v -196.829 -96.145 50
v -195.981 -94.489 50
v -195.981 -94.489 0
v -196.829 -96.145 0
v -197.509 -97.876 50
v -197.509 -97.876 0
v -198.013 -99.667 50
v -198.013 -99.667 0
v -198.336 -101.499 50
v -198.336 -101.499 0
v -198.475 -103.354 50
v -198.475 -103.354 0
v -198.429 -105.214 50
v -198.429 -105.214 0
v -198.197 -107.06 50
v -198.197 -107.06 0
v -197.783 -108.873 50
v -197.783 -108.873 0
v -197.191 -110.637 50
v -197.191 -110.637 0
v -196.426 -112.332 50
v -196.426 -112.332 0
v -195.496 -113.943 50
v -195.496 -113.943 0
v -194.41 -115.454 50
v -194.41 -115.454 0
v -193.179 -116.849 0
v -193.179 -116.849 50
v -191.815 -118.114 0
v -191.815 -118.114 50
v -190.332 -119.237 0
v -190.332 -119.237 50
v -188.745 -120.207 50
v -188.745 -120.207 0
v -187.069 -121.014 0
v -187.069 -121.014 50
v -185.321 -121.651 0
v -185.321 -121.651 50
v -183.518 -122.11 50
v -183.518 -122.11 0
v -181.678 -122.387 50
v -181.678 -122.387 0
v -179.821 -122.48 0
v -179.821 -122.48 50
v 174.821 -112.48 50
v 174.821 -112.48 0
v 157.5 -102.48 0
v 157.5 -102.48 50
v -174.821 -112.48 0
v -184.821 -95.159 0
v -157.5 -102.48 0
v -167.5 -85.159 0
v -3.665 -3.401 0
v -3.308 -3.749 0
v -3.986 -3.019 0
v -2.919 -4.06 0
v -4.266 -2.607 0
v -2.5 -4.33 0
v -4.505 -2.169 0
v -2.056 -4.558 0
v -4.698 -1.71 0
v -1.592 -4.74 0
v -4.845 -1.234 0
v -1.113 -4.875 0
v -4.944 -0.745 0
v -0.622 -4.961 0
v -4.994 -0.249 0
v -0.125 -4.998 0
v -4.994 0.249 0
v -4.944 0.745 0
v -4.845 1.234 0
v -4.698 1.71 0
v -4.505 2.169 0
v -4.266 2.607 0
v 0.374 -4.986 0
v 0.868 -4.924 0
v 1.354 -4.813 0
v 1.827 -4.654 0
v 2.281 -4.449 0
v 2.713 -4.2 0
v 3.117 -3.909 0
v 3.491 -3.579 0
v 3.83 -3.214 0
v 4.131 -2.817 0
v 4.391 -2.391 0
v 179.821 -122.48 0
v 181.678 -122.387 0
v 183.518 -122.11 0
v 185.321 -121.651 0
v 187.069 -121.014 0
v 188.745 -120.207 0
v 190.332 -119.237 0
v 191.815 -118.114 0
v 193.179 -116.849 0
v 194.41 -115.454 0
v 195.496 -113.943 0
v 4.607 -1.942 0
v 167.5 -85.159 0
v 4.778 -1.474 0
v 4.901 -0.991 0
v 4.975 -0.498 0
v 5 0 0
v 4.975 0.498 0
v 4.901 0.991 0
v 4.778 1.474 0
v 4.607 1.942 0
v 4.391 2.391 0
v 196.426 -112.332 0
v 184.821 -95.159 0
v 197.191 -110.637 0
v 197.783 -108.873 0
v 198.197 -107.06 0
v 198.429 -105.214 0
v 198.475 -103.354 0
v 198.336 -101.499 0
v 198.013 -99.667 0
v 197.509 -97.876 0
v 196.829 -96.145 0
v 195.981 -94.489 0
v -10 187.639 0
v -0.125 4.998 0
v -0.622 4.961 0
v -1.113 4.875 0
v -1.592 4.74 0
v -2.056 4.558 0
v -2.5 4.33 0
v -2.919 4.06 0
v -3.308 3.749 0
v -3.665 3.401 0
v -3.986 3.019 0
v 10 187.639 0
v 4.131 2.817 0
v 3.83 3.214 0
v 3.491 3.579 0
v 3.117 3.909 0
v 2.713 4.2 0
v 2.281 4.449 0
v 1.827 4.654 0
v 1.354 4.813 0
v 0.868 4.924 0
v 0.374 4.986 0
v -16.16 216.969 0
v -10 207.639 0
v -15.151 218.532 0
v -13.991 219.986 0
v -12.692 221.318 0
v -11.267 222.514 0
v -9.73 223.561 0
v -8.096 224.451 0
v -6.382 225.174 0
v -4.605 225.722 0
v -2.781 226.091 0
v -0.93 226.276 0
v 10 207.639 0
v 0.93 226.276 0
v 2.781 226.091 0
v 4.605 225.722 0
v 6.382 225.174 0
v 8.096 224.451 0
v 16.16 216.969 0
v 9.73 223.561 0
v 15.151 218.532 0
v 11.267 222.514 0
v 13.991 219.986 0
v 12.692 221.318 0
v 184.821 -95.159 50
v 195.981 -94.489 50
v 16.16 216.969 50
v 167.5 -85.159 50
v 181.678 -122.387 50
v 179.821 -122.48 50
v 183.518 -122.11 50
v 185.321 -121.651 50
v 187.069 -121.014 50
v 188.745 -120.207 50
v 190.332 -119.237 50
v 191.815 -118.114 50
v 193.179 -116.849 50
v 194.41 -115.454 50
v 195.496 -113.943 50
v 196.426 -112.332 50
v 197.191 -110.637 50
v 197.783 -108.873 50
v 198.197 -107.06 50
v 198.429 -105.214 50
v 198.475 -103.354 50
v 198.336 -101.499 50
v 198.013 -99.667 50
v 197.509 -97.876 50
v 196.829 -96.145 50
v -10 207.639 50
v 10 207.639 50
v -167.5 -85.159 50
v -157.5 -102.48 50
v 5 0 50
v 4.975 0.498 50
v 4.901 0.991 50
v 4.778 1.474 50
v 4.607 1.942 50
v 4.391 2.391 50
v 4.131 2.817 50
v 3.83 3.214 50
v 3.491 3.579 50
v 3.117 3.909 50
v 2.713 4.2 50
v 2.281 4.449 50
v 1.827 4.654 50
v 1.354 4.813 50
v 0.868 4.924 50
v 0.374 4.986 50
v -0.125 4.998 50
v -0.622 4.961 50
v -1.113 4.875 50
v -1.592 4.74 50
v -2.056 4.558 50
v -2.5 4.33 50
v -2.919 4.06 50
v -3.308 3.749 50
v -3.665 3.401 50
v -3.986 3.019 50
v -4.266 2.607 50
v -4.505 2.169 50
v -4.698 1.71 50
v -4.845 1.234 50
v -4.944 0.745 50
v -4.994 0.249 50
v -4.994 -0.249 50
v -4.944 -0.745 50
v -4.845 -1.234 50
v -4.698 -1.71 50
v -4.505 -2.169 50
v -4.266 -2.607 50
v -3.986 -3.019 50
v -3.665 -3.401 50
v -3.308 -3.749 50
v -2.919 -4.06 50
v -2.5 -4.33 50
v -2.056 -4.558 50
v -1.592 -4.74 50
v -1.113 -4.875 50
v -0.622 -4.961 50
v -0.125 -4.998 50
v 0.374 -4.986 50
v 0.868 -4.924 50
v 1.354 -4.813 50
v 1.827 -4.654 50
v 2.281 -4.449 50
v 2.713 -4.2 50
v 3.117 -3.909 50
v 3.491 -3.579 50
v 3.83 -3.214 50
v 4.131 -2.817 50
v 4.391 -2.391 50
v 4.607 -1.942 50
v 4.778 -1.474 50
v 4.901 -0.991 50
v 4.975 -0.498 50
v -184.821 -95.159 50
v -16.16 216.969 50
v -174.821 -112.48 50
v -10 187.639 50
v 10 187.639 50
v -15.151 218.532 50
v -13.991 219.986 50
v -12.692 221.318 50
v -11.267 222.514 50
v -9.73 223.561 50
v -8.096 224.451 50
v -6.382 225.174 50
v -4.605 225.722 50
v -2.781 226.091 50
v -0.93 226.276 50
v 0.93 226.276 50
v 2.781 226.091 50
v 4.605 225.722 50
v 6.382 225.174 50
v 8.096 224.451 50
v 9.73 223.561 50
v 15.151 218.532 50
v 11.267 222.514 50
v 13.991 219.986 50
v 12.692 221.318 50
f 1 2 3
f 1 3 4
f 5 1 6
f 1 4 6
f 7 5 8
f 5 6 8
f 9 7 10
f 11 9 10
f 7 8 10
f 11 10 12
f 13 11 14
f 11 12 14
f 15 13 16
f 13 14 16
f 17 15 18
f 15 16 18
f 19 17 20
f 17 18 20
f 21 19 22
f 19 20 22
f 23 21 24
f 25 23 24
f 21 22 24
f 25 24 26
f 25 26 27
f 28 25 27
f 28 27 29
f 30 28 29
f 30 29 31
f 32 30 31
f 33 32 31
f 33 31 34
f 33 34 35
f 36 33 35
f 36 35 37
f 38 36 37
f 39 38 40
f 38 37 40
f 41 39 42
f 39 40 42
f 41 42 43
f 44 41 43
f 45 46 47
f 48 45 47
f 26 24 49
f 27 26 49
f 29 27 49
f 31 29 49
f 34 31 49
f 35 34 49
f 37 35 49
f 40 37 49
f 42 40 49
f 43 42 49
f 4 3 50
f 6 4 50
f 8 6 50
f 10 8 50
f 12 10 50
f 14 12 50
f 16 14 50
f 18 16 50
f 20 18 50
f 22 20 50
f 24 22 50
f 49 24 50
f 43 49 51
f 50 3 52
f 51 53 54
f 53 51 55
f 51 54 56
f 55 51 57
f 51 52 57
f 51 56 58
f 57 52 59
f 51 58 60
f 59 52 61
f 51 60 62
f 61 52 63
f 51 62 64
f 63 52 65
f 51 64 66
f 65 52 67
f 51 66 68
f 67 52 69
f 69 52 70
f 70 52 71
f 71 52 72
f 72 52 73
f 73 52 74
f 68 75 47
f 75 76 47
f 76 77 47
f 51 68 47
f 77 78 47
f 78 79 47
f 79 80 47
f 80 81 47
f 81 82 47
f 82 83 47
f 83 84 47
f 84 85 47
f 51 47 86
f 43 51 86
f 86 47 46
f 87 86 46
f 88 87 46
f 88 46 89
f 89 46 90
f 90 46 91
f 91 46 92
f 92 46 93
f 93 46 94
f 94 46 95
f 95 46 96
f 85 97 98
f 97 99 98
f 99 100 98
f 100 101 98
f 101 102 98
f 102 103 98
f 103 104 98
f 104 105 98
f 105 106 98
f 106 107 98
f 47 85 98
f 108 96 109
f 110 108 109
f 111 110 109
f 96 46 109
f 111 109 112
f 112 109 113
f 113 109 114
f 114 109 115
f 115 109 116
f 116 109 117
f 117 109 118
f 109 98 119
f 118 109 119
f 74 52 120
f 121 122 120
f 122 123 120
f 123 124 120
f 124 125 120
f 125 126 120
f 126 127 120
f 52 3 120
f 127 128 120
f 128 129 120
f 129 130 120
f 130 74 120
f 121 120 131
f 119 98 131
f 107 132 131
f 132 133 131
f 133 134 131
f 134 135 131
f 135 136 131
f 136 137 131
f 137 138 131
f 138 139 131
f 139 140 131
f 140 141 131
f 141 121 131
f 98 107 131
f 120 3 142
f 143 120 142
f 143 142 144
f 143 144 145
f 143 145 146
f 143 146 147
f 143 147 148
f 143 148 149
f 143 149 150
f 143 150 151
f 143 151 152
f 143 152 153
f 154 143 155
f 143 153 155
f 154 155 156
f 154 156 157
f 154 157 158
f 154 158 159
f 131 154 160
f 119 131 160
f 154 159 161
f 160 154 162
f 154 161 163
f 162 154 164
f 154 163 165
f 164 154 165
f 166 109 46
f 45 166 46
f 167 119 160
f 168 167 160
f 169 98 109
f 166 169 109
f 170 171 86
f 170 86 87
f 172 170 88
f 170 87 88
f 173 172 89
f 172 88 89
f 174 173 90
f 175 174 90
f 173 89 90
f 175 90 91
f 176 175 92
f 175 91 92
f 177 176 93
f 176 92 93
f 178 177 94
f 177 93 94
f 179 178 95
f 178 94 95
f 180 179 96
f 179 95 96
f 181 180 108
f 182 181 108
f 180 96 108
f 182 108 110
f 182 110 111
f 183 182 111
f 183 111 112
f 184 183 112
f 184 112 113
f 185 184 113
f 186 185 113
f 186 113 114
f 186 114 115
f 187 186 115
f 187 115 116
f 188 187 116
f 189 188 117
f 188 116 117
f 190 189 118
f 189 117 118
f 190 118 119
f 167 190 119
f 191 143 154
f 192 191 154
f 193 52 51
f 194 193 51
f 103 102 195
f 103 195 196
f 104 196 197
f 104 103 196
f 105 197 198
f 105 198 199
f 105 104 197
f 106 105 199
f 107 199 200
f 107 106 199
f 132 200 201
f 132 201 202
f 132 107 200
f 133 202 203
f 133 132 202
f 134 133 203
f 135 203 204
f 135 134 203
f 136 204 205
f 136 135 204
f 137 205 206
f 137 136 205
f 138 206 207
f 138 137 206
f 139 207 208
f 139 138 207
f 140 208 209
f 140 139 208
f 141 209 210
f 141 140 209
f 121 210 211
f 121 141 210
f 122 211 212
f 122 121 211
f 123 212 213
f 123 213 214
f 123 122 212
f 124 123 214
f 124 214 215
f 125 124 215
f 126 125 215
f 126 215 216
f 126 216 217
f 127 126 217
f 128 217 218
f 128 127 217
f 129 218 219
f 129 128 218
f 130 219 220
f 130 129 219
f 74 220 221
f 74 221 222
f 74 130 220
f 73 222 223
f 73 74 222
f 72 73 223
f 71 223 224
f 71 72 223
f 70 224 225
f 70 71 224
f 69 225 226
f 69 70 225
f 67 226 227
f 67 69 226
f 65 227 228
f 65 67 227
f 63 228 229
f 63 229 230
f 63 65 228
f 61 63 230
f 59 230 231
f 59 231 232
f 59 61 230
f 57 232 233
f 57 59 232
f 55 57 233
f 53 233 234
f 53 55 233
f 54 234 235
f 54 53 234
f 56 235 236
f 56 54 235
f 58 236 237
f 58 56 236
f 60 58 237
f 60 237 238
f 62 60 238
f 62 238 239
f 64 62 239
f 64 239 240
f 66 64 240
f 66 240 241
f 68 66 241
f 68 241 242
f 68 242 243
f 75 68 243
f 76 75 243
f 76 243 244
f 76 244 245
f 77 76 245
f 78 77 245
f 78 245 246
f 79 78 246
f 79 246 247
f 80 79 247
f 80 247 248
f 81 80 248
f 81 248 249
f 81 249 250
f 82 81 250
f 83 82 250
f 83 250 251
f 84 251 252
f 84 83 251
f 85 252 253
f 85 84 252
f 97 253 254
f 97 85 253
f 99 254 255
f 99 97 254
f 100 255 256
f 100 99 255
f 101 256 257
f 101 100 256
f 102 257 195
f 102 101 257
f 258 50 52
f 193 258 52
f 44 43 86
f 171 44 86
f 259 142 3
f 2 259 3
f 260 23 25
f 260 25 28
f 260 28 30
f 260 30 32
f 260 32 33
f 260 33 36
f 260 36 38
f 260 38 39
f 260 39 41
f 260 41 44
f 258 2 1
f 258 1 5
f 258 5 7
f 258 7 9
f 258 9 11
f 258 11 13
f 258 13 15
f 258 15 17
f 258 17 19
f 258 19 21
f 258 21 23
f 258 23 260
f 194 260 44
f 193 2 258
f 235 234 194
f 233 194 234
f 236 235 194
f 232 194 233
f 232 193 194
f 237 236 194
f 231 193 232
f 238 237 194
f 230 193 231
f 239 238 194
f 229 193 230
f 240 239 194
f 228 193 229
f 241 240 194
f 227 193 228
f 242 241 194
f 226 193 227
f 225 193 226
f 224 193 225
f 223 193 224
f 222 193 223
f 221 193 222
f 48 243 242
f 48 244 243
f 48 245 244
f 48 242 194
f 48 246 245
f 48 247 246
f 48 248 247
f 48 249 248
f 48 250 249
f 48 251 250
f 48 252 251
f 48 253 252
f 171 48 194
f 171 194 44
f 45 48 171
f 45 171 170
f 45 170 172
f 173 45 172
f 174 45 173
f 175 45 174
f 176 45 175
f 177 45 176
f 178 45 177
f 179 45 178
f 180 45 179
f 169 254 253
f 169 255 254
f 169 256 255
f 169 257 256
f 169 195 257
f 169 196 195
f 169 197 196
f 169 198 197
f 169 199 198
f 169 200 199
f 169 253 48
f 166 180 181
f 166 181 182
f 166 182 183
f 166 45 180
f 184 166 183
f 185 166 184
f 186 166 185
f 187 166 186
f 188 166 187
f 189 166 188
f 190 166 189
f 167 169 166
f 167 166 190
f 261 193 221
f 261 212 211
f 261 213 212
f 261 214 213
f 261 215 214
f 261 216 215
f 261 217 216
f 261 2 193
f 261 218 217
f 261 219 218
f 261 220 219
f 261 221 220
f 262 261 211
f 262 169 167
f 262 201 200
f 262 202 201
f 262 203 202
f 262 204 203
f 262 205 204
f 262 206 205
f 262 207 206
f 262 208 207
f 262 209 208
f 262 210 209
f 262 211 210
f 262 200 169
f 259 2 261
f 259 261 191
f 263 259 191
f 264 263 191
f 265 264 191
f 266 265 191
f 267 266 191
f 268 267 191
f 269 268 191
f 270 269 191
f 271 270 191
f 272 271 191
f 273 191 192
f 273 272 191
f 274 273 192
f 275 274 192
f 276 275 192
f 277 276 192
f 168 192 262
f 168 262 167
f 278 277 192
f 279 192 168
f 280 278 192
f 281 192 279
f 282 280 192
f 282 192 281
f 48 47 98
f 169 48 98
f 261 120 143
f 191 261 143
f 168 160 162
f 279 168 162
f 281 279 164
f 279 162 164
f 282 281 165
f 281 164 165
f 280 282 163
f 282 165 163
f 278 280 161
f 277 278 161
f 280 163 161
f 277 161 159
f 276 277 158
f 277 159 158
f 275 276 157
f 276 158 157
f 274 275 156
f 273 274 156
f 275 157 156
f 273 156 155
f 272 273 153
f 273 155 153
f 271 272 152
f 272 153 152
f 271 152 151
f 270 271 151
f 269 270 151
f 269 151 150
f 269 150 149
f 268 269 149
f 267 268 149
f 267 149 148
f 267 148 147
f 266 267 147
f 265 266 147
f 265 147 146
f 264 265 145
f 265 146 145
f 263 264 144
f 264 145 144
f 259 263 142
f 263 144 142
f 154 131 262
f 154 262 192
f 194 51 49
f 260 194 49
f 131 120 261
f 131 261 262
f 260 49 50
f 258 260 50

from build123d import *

# Parameters (mm, degrees)
F0_R     = 5
F0_W     = 20
F0_H     = 20
F1_DEPTH = 50


with BuildPart() as f1:
    # F0 (on Top) → F1 (new body)
    with BuildSketch(Plane.XY):
        with BuildLine():
            Line((-16.160254, 216.968965), (-195.980762, -94.489292))
            ThreePointArc((-195.980762, -94.489292), (-195.980762, -113.149546), (-179.820508, -122.479673))
            Line((-179.820508, -122.479673), (179.820508, -122.479673))
            ThreePointArc((179.820508, -122.479673), (195.980762, -113.149546), (195.980762, -94.489292))
            Line((195.980762, -94.489292), (16.160254, 216.968965))
            ThreePointArc((16.160254, 216.968965), (0, 226.299092), (-16.160254, 216.968965))
        make_face()
        Polygon((-167.5, -85.159165), (-157.5, -102.479673), (-174.820508, -112.479673), (-184.820508, -95.159165), align=None, mode=Mode.SUBTRACT)
        Circle(F0_R, mode=Mode.SUBTRACT)
        Polygon((157.5, -102.479673), (167.5, -85.159165), (184.820508, -95.159165), (174.820508, -112.479673), align=None, mode=Mode.SUBTRACT)
        with Locations((0, 197.638837)):
            Rectangle(F0_W, F0_H, mode=Mode.SUBTRACT)
    extrude(amount=F1_DEPTH)


solid = f1.part
